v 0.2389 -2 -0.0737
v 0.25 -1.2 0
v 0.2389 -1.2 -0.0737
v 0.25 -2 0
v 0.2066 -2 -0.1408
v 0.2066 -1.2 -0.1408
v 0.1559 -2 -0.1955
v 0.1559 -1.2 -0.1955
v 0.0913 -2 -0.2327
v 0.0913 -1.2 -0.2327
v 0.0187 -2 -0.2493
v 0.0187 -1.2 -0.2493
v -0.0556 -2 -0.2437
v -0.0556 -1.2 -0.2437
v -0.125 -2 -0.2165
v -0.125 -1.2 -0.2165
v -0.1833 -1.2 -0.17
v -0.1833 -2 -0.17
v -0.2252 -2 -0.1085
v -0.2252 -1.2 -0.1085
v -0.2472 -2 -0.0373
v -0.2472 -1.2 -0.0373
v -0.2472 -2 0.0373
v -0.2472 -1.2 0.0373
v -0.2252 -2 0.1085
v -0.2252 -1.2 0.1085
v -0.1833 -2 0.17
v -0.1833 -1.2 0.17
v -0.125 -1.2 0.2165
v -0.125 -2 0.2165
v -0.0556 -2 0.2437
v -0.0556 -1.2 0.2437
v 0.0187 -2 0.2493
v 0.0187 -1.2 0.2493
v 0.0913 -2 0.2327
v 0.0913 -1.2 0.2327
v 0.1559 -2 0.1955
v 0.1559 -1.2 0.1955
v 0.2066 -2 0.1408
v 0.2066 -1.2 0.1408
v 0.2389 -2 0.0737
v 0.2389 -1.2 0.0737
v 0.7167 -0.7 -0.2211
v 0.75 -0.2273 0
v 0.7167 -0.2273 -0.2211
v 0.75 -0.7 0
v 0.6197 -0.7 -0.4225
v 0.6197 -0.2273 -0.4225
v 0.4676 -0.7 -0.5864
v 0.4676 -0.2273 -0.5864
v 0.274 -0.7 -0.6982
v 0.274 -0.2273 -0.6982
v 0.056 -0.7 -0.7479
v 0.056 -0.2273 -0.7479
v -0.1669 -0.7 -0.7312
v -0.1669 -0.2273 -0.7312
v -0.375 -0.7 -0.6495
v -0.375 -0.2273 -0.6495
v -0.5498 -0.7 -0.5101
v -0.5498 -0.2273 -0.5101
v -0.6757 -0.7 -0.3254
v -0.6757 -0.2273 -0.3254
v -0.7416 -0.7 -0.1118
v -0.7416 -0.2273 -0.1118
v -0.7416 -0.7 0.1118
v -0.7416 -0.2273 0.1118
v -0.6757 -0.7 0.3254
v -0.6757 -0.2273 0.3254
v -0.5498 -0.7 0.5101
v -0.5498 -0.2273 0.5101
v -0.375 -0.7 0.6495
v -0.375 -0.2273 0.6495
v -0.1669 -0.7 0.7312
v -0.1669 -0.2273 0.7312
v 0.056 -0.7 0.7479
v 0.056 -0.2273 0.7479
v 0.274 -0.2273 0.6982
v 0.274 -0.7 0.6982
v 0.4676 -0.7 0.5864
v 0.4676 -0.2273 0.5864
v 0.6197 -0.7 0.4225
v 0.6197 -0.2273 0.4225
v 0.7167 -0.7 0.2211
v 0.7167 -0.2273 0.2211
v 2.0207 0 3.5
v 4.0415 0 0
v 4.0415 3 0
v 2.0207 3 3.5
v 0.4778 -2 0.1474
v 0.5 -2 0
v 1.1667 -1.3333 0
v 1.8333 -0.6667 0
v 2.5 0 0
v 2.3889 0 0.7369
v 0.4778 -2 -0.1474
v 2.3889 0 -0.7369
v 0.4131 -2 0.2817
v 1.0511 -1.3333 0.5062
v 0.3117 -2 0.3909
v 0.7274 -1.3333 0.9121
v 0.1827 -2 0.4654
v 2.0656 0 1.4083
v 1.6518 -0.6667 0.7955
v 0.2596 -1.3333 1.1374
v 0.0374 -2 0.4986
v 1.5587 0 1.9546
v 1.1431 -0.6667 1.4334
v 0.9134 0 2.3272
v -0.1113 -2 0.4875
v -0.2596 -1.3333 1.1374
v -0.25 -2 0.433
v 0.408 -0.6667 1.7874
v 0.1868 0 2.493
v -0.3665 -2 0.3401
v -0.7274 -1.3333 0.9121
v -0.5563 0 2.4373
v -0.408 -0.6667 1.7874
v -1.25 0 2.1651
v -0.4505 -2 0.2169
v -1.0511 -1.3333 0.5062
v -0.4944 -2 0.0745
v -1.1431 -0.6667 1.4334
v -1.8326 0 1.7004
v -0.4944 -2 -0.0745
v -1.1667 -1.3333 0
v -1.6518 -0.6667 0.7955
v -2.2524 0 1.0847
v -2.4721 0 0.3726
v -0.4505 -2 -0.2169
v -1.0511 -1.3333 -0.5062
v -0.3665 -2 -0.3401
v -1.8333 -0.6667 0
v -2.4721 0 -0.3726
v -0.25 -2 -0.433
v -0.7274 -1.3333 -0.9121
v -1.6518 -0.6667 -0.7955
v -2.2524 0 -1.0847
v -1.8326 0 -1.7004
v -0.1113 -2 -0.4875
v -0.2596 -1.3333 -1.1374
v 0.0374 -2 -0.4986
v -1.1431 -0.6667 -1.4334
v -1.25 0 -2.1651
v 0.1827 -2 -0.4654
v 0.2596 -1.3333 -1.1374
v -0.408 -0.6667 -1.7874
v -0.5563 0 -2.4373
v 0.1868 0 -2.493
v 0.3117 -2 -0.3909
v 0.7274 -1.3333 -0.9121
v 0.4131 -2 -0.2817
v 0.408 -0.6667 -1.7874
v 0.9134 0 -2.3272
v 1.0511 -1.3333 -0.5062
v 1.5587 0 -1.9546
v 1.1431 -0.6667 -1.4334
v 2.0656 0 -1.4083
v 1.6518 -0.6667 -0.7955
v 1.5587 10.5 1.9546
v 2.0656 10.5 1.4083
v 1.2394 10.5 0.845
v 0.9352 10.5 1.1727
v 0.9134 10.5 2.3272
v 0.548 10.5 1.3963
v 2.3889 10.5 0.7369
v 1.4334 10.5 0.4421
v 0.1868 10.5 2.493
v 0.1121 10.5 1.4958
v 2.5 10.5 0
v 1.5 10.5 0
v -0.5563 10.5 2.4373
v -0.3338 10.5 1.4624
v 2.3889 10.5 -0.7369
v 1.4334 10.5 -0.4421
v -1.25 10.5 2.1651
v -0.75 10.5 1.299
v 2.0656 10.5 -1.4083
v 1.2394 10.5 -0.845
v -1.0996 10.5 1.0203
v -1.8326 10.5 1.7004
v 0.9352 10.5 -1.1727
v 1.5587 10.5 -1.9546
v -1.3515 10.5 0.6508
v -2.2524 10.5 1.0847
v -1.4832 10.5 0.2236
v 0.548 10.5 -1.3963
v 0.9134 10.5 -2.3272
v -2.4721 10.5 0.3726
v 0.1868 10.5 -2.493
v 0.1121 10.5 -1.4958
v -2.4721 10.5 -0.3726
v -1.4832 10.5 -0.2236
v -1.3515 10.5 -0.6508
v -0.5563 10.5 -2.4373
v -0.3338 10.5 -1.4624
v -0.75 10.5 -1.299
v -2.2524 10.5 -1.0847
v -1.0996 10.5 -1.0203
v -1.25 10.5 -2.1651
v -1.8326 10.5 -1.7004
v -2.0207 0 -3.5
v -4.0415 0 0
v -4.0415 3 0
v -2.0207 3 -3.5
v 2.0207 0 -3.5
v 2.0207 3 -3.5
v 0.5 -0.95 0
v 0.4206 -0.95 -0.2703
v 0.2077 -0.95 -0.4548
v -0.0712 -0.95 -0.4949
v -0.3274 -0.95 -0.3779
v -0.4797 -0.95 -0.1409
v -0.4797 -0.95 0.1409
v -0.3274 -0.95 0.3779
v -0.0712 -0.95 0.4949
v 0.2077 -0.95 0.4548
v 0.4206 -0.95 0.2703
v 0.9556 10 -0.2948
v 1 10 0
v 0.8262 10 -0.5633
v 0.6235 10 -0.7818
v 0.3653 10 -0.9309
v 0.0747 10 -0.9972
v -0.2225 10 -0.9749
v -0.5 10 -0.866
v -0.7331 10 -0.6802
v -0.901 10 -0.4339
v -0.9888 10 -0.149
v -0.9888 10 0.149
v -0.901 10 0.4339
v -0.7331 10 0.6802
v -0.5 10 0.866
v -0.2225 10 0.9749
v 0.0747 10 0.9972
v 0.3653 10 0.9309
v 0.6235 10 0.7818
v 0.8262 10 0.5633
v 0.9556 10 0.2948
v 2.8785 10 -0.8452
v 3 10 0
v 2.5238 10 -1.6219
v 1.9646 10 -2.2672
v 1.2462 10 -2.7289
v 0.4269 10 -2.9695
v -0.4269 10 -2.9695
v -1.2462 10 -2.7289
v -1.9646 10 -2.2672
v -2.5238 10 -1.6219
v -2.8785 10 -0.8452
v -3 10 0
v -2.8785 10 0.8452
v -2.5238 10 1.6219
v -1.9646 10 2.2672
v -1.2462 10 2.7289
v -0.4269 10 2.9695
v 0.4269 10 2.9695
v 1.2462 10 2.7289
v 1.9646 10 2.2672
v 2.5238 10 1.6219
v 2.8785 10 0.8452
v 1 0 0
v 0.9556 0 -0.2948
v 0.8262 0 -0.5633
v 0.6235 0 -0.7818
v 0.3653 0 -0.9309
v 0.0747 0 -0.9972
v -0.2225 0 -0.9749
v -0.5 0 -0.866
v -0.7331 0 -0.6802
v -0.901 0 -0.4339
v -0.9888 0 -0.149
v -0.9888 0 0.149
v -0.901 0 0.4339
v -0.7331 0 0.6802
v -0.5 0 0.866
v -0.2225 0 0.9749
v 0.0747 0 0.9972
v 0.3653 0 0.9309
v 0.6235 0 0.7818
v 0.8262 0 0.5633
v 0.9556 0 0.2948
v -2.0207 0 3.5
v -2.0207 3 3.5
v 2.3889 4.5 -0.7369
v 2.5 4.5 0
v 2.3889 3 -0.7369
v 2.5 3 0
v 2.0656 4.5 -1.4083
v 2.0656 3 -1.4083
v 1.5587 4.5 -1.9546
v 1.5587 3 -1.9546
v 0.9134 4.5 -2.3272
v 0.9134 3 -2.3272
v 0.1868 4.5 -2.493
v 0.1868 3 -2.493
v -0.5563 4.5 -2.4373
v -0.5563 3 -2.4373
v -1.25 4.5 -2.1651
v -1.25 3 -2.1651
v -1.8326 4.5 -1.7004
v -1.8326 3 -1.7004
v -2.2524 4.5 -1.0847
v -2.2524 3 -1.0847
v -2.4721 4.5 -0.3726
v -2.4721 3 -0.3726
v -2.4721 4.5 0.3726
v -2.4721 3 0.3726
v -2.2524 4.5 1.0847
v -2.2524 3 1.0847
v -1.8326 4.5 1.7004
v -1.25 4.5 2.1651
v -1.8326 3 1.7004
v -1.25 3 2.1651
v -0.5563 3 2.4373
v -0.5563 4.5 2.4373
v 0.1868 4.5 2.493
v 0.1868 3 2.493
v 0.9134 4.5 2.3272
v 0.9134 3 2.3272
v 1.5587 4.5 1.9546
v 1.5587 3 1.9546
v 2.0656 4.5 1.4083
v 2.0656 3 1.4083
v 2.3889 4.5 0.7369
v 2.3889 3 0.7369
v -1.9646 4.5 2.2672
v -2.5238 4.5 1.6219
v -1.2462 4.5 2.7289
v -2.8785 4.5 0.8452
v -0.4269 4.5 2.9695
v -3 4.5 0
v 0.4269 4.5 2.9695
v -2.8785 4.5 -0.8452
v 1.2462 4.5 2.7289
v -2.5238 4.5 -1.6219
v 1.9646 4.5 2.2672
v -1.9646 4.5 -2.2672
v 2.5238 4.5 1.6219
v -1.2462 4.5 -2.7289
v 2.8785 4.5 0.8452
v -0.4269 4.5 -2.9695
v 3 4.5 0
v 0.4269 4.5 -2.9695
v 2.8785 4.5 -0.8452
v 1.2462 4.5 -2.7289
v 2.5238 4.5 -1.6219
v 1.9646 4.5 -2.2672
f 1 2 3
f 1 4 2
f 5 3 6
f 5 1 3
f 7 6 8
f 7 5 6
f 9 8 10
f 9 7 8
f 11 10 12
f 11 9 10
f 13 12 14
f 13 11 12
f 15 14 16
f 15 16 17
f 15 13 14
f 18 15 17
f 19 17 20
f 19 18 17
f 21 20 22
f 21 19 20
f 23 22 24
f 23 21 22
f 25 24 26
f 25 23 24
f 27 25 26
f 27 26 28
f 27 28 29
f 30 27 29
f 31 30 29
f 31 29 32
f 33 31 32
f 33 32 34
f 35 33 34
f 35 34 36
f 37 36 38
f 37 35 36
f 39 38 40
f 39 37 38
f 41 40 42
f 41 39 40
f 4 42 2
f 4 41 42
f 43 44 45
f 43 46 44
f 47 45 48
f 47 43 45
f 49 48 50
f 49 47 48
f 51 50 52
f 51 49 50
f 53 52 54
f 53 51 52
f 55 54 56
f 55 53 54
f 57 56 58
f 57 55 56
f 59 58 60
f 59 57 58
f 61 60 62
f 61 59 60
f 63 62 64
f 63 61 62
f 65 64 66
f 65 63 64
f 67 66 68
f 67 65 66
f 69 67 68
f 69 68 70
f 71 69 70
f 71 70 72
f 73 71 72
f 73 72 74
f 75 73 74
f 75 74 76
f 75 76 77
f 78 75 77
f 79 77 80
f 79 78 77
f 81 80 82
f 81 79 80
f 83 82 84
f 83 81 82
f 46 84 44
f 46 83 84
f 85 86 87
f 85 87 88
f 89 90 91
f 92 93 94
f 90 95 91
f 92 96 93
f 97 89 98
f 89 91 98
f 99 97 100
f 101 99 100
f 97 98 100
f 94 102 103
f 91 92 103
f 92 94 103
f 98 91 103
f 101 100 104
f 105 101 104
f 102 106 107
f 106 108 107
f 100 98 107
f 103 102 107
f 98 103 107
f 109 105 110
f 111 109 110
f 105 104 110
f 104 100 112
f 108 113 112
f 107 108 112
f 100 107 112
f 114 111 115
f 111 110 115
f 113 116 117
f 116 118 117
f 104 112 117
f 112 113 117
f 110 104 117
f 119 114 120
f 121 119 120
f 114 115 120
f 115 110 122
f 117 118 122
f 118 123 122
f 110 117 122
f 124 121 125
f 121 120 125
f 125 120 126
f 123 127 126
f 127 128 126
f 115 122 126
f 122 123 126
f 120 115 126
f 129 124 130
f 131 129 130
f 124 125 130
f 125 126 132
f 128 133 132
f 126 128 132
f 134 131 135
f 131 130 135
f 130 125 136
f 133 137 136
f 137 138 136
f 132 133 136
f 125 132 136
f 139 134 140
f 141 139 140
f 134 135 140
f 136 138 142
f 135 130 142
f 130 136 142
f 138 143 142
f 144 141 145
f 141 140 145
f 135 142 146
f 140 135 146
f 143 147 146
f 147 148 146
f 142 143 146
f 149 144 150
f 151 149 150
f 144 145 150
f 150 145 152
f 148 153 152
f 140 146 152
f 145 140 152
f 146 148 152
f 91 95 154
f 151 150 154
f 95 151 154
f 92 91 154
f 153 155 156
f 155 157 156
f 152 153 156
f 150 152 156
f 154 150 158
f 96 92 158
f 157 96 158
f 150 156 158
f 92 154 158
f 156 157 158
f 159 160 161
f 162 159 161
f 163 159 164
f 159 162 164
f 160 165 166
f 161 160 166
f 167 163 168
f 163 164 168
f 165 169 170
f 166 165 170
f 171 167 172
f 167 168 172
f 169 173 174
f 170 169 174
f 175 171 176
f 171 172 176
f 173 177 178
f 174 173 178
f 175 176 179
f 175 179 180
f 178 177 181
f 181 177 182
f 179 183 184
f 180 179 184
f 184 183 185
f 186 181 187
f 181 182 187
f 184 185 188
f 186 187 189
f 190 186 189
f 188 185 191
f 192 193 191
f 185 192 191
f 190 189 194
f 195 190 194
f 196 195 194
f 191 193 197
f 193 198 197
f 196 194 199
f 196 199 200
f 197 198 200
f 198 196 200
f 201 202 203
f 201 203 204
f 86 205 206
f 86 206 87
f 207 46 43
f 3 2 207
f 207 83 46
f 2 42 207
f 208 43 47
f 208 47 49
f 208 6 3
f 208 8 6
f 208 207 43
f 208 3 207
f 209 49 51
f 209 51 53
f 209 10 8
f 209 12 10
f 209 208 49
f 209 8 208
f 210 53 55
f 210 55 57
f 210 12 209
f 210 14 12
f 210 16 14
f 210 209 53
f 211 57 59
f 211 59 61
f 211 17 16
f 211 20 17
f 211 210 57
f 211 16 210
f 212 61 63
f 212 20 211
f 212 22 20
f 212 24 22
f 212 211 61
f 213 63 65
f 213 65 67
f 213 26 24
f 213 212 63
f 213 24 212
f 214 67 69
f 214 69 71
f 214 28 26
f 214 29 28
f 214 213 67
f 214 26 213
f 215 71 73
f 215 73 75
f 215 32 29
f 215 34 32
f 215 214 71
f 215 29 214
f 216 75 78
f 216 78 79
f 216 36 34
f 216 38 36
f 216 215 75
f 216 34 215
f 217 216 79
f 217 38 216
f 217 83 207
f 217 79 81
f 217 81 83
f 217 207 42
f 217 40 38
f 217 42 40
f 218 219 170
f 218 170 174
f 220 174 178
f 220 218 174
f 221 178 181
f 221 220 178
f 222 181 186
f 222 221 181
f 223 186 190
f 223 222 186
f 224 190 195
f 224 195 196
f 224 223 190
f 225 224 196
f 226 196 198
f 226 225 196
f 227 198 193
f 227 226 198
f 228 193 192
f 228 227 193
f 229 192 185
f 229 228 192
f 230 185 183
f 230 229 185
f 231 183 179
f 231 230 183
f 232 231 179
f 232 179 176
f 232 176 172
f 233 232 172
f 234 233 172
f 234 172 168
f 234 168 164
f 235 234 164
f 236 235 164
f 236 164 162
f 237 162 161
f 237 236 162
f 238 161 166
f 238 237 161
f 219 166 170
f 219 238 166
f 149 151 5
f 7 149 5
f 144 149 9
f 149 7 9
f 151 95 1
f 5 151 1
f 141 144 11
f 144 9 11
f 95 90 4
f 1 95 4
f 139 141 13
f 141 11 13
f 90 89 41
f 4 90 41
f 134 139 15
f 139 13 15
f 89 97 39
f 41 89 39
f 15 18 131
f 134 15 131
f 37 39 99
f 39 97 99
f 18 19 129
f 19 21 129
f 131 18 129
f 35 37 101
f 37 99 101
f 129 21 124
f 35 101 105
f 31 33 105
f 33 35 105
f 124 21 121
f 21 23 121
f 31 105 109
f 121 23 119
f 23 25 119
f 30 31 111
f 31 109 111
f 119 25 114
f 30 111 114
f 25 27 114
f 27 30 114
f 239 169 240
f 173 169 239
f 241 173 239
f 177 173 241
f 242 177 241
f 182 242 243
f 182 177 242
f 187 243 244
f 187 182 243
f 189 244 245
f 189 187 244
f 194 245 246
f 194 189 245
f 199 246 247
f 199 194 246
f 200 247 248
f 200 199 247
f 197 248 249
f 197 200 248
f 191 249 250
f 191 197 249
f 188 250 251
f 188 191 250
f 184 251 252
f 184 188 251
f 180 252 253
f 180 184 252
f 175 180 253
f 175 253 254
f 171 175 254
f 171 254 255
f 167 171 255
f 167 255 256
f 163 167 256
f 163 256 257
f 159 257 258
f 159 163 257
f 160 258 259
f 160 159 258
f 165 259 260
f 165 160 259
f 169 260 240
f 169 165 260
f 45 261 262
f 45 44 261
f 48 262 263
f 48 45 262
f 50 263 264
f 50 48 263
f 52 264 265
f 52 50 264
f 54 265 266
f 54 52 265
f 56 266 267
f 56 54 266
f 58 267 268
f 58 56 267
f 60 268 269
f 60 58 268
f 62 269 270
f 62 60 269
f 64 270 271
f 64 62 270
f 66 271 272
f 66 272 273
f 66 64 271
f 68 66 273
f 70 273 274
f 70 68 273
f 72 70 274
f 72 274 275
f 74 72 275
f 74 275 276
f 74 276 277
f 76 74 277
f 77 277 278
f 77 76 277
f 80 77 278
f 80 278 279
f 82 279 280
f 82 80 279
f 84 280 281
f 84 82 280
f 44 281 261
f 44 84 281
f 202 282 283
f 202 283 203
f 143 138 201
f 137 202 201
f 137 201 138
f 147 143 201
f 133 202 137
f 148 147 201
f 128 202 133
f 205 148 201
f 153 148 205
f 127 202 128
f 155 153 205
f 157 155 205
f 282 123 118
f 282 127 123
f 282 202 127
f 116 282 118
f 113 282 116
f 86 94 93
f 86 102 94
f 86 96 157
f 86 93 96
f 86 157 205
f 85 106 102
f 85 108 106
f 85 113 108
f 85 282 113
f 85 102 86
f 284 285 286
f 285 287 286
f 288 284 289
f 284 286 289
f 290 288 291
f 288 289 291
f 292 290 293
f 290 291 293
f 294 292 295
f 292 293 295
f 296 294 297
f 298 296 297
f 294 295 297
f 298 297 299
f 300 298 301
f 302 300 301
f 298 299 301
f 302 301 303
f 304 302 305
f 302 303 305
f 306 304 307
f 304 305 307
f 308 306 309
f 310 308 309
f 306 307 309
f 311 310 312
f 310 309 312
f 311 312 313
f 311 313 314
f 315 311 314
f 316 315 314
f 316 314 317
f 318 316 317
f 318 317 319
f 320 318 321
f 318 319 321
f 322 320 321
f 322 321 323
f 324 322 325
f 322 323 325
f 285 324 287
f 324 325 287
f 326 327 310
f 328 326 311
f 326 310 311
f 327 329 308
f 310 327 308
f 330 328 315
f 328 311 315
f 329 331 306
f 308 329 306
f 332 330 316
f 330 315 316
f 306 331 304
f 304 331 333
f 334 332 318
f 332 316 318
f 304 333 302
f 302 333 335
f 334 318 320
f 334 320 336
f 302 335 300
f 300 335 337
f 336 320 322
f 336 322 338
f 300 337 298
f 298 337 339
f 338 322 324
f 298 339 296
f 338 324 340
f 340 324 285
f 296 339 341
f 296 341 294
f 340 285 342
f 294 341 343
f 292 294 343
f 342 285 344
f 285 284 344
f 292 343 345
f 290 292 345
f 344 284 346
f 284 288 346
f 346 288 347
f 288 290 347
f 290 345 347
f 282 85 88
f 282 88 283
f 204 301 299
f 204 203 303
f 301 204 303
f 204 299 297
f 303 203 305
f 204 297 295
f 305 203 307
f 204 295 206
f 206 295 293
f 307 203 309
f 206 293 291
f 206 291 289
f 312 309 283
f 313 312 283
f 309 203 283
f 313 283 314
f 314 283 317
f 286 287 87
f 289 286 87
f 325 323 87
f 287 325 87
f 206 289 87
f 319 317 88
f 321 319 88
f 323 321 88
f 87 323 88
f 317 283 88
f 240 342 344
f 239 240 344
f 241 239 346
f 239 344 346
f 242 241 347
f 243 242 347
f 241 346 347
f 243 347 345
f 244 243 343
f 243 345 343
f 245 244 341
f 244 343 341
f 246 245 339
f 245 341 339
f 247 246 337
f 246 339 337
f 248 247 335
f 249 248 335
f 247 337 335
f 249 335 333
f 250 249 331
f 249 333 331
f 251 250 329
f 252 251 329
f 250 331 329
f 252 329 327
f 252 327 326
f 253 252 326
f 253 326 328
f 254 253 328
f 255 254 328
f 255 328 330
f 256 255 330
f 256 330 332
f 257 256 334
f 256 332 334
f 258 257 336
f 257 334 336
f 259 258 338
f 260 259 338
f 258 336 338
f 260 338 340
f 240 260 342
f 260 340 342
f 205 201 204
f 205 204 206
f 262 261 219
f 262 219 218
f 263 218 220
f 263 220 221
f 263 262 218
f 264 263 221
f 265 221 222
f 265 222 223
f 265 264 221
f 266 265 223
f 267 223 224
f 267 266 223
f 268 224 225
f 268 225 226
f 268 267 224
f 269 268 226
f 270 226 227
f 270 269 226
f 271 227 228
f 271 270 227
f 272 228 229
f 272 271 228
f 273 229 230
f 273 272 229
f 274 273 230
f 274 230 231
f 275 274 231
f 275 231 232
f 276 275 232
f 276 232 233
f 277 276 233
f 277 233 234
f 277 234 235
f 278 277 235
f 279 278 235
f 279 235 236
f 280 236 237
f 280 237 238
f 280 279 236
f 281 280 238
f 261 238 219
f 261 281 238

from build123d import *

# Parameters (mm, degrees)
BOSS_EXTRUDE1_DEPTH = 3
CHAMFER1_SIZE       = 0.5


with BuildPart() as part:
    # Sketch1 → Boss-Extrude1 (new body)
    with BuildSketch(Plane.XZ):
        Polygon((-2.020725942, 3.5), (-4.041451884, 0), (-2.020725942, -3.5), (2.020725942, -3.5), (4.041451884, 0), (2.020725942, 3.5), align=None)
    extrude(amount=-BOSS_EXTRUDE1_DEPTH)

    # Sketch2 → Revolve1 (revolve)
    with BuildSketch(Plane(origin=(0, 0, 0), x_dir=(-1, 0, 0), z_dir=(0, 0, -1))):
        Polygon((-2.5, 3), (0, 3), (0, 10.5), (-3, 10.5), (-3, 4.5), (-2.5, 4.5), align=None)
    revolve(axis=Axis((0, 3, 0), (0, 1, 0)))

    # Sketch3 → Revolve2 (revolve)
    with BuildSketch(Plane.XY):
        Polygon((2.5, 0), (0, 0), (0, -2), (0.5, -2), align=None)
    revolve(axis=Axis((0, 0, 0), (0, -1, 0)))

    # Sketch4 → Cut-Revolve1 (revolve, cut)
    with BuildSketch(Plane(origin=(0, 0, 0), x_dir=(-1, 0, 0), z_dir=(0, 0, -1))):
        Polygon((-0.25, -2), (0, -2), (0, 10.5), (-1, 10.5), (-1, 0), (-0.75, -0.227272727), (-0.75, -0.7), (-0.25, -1.2), align=None)
    revolve(axis=Axis((0, -2, 0), (0, 1, 0)), mode=Mode.SUBTRACT)

    # Chamfer1
    chamfer1_edges = [part.edges().sort_by_distance(p)[0] for p in [
        (-3, 10.5, 0),
        (-1, 10.5, 0),
    ]]
    chamfer(chamfer1_edges, length=CHAMFER1_SIZE)


solid = part.part
